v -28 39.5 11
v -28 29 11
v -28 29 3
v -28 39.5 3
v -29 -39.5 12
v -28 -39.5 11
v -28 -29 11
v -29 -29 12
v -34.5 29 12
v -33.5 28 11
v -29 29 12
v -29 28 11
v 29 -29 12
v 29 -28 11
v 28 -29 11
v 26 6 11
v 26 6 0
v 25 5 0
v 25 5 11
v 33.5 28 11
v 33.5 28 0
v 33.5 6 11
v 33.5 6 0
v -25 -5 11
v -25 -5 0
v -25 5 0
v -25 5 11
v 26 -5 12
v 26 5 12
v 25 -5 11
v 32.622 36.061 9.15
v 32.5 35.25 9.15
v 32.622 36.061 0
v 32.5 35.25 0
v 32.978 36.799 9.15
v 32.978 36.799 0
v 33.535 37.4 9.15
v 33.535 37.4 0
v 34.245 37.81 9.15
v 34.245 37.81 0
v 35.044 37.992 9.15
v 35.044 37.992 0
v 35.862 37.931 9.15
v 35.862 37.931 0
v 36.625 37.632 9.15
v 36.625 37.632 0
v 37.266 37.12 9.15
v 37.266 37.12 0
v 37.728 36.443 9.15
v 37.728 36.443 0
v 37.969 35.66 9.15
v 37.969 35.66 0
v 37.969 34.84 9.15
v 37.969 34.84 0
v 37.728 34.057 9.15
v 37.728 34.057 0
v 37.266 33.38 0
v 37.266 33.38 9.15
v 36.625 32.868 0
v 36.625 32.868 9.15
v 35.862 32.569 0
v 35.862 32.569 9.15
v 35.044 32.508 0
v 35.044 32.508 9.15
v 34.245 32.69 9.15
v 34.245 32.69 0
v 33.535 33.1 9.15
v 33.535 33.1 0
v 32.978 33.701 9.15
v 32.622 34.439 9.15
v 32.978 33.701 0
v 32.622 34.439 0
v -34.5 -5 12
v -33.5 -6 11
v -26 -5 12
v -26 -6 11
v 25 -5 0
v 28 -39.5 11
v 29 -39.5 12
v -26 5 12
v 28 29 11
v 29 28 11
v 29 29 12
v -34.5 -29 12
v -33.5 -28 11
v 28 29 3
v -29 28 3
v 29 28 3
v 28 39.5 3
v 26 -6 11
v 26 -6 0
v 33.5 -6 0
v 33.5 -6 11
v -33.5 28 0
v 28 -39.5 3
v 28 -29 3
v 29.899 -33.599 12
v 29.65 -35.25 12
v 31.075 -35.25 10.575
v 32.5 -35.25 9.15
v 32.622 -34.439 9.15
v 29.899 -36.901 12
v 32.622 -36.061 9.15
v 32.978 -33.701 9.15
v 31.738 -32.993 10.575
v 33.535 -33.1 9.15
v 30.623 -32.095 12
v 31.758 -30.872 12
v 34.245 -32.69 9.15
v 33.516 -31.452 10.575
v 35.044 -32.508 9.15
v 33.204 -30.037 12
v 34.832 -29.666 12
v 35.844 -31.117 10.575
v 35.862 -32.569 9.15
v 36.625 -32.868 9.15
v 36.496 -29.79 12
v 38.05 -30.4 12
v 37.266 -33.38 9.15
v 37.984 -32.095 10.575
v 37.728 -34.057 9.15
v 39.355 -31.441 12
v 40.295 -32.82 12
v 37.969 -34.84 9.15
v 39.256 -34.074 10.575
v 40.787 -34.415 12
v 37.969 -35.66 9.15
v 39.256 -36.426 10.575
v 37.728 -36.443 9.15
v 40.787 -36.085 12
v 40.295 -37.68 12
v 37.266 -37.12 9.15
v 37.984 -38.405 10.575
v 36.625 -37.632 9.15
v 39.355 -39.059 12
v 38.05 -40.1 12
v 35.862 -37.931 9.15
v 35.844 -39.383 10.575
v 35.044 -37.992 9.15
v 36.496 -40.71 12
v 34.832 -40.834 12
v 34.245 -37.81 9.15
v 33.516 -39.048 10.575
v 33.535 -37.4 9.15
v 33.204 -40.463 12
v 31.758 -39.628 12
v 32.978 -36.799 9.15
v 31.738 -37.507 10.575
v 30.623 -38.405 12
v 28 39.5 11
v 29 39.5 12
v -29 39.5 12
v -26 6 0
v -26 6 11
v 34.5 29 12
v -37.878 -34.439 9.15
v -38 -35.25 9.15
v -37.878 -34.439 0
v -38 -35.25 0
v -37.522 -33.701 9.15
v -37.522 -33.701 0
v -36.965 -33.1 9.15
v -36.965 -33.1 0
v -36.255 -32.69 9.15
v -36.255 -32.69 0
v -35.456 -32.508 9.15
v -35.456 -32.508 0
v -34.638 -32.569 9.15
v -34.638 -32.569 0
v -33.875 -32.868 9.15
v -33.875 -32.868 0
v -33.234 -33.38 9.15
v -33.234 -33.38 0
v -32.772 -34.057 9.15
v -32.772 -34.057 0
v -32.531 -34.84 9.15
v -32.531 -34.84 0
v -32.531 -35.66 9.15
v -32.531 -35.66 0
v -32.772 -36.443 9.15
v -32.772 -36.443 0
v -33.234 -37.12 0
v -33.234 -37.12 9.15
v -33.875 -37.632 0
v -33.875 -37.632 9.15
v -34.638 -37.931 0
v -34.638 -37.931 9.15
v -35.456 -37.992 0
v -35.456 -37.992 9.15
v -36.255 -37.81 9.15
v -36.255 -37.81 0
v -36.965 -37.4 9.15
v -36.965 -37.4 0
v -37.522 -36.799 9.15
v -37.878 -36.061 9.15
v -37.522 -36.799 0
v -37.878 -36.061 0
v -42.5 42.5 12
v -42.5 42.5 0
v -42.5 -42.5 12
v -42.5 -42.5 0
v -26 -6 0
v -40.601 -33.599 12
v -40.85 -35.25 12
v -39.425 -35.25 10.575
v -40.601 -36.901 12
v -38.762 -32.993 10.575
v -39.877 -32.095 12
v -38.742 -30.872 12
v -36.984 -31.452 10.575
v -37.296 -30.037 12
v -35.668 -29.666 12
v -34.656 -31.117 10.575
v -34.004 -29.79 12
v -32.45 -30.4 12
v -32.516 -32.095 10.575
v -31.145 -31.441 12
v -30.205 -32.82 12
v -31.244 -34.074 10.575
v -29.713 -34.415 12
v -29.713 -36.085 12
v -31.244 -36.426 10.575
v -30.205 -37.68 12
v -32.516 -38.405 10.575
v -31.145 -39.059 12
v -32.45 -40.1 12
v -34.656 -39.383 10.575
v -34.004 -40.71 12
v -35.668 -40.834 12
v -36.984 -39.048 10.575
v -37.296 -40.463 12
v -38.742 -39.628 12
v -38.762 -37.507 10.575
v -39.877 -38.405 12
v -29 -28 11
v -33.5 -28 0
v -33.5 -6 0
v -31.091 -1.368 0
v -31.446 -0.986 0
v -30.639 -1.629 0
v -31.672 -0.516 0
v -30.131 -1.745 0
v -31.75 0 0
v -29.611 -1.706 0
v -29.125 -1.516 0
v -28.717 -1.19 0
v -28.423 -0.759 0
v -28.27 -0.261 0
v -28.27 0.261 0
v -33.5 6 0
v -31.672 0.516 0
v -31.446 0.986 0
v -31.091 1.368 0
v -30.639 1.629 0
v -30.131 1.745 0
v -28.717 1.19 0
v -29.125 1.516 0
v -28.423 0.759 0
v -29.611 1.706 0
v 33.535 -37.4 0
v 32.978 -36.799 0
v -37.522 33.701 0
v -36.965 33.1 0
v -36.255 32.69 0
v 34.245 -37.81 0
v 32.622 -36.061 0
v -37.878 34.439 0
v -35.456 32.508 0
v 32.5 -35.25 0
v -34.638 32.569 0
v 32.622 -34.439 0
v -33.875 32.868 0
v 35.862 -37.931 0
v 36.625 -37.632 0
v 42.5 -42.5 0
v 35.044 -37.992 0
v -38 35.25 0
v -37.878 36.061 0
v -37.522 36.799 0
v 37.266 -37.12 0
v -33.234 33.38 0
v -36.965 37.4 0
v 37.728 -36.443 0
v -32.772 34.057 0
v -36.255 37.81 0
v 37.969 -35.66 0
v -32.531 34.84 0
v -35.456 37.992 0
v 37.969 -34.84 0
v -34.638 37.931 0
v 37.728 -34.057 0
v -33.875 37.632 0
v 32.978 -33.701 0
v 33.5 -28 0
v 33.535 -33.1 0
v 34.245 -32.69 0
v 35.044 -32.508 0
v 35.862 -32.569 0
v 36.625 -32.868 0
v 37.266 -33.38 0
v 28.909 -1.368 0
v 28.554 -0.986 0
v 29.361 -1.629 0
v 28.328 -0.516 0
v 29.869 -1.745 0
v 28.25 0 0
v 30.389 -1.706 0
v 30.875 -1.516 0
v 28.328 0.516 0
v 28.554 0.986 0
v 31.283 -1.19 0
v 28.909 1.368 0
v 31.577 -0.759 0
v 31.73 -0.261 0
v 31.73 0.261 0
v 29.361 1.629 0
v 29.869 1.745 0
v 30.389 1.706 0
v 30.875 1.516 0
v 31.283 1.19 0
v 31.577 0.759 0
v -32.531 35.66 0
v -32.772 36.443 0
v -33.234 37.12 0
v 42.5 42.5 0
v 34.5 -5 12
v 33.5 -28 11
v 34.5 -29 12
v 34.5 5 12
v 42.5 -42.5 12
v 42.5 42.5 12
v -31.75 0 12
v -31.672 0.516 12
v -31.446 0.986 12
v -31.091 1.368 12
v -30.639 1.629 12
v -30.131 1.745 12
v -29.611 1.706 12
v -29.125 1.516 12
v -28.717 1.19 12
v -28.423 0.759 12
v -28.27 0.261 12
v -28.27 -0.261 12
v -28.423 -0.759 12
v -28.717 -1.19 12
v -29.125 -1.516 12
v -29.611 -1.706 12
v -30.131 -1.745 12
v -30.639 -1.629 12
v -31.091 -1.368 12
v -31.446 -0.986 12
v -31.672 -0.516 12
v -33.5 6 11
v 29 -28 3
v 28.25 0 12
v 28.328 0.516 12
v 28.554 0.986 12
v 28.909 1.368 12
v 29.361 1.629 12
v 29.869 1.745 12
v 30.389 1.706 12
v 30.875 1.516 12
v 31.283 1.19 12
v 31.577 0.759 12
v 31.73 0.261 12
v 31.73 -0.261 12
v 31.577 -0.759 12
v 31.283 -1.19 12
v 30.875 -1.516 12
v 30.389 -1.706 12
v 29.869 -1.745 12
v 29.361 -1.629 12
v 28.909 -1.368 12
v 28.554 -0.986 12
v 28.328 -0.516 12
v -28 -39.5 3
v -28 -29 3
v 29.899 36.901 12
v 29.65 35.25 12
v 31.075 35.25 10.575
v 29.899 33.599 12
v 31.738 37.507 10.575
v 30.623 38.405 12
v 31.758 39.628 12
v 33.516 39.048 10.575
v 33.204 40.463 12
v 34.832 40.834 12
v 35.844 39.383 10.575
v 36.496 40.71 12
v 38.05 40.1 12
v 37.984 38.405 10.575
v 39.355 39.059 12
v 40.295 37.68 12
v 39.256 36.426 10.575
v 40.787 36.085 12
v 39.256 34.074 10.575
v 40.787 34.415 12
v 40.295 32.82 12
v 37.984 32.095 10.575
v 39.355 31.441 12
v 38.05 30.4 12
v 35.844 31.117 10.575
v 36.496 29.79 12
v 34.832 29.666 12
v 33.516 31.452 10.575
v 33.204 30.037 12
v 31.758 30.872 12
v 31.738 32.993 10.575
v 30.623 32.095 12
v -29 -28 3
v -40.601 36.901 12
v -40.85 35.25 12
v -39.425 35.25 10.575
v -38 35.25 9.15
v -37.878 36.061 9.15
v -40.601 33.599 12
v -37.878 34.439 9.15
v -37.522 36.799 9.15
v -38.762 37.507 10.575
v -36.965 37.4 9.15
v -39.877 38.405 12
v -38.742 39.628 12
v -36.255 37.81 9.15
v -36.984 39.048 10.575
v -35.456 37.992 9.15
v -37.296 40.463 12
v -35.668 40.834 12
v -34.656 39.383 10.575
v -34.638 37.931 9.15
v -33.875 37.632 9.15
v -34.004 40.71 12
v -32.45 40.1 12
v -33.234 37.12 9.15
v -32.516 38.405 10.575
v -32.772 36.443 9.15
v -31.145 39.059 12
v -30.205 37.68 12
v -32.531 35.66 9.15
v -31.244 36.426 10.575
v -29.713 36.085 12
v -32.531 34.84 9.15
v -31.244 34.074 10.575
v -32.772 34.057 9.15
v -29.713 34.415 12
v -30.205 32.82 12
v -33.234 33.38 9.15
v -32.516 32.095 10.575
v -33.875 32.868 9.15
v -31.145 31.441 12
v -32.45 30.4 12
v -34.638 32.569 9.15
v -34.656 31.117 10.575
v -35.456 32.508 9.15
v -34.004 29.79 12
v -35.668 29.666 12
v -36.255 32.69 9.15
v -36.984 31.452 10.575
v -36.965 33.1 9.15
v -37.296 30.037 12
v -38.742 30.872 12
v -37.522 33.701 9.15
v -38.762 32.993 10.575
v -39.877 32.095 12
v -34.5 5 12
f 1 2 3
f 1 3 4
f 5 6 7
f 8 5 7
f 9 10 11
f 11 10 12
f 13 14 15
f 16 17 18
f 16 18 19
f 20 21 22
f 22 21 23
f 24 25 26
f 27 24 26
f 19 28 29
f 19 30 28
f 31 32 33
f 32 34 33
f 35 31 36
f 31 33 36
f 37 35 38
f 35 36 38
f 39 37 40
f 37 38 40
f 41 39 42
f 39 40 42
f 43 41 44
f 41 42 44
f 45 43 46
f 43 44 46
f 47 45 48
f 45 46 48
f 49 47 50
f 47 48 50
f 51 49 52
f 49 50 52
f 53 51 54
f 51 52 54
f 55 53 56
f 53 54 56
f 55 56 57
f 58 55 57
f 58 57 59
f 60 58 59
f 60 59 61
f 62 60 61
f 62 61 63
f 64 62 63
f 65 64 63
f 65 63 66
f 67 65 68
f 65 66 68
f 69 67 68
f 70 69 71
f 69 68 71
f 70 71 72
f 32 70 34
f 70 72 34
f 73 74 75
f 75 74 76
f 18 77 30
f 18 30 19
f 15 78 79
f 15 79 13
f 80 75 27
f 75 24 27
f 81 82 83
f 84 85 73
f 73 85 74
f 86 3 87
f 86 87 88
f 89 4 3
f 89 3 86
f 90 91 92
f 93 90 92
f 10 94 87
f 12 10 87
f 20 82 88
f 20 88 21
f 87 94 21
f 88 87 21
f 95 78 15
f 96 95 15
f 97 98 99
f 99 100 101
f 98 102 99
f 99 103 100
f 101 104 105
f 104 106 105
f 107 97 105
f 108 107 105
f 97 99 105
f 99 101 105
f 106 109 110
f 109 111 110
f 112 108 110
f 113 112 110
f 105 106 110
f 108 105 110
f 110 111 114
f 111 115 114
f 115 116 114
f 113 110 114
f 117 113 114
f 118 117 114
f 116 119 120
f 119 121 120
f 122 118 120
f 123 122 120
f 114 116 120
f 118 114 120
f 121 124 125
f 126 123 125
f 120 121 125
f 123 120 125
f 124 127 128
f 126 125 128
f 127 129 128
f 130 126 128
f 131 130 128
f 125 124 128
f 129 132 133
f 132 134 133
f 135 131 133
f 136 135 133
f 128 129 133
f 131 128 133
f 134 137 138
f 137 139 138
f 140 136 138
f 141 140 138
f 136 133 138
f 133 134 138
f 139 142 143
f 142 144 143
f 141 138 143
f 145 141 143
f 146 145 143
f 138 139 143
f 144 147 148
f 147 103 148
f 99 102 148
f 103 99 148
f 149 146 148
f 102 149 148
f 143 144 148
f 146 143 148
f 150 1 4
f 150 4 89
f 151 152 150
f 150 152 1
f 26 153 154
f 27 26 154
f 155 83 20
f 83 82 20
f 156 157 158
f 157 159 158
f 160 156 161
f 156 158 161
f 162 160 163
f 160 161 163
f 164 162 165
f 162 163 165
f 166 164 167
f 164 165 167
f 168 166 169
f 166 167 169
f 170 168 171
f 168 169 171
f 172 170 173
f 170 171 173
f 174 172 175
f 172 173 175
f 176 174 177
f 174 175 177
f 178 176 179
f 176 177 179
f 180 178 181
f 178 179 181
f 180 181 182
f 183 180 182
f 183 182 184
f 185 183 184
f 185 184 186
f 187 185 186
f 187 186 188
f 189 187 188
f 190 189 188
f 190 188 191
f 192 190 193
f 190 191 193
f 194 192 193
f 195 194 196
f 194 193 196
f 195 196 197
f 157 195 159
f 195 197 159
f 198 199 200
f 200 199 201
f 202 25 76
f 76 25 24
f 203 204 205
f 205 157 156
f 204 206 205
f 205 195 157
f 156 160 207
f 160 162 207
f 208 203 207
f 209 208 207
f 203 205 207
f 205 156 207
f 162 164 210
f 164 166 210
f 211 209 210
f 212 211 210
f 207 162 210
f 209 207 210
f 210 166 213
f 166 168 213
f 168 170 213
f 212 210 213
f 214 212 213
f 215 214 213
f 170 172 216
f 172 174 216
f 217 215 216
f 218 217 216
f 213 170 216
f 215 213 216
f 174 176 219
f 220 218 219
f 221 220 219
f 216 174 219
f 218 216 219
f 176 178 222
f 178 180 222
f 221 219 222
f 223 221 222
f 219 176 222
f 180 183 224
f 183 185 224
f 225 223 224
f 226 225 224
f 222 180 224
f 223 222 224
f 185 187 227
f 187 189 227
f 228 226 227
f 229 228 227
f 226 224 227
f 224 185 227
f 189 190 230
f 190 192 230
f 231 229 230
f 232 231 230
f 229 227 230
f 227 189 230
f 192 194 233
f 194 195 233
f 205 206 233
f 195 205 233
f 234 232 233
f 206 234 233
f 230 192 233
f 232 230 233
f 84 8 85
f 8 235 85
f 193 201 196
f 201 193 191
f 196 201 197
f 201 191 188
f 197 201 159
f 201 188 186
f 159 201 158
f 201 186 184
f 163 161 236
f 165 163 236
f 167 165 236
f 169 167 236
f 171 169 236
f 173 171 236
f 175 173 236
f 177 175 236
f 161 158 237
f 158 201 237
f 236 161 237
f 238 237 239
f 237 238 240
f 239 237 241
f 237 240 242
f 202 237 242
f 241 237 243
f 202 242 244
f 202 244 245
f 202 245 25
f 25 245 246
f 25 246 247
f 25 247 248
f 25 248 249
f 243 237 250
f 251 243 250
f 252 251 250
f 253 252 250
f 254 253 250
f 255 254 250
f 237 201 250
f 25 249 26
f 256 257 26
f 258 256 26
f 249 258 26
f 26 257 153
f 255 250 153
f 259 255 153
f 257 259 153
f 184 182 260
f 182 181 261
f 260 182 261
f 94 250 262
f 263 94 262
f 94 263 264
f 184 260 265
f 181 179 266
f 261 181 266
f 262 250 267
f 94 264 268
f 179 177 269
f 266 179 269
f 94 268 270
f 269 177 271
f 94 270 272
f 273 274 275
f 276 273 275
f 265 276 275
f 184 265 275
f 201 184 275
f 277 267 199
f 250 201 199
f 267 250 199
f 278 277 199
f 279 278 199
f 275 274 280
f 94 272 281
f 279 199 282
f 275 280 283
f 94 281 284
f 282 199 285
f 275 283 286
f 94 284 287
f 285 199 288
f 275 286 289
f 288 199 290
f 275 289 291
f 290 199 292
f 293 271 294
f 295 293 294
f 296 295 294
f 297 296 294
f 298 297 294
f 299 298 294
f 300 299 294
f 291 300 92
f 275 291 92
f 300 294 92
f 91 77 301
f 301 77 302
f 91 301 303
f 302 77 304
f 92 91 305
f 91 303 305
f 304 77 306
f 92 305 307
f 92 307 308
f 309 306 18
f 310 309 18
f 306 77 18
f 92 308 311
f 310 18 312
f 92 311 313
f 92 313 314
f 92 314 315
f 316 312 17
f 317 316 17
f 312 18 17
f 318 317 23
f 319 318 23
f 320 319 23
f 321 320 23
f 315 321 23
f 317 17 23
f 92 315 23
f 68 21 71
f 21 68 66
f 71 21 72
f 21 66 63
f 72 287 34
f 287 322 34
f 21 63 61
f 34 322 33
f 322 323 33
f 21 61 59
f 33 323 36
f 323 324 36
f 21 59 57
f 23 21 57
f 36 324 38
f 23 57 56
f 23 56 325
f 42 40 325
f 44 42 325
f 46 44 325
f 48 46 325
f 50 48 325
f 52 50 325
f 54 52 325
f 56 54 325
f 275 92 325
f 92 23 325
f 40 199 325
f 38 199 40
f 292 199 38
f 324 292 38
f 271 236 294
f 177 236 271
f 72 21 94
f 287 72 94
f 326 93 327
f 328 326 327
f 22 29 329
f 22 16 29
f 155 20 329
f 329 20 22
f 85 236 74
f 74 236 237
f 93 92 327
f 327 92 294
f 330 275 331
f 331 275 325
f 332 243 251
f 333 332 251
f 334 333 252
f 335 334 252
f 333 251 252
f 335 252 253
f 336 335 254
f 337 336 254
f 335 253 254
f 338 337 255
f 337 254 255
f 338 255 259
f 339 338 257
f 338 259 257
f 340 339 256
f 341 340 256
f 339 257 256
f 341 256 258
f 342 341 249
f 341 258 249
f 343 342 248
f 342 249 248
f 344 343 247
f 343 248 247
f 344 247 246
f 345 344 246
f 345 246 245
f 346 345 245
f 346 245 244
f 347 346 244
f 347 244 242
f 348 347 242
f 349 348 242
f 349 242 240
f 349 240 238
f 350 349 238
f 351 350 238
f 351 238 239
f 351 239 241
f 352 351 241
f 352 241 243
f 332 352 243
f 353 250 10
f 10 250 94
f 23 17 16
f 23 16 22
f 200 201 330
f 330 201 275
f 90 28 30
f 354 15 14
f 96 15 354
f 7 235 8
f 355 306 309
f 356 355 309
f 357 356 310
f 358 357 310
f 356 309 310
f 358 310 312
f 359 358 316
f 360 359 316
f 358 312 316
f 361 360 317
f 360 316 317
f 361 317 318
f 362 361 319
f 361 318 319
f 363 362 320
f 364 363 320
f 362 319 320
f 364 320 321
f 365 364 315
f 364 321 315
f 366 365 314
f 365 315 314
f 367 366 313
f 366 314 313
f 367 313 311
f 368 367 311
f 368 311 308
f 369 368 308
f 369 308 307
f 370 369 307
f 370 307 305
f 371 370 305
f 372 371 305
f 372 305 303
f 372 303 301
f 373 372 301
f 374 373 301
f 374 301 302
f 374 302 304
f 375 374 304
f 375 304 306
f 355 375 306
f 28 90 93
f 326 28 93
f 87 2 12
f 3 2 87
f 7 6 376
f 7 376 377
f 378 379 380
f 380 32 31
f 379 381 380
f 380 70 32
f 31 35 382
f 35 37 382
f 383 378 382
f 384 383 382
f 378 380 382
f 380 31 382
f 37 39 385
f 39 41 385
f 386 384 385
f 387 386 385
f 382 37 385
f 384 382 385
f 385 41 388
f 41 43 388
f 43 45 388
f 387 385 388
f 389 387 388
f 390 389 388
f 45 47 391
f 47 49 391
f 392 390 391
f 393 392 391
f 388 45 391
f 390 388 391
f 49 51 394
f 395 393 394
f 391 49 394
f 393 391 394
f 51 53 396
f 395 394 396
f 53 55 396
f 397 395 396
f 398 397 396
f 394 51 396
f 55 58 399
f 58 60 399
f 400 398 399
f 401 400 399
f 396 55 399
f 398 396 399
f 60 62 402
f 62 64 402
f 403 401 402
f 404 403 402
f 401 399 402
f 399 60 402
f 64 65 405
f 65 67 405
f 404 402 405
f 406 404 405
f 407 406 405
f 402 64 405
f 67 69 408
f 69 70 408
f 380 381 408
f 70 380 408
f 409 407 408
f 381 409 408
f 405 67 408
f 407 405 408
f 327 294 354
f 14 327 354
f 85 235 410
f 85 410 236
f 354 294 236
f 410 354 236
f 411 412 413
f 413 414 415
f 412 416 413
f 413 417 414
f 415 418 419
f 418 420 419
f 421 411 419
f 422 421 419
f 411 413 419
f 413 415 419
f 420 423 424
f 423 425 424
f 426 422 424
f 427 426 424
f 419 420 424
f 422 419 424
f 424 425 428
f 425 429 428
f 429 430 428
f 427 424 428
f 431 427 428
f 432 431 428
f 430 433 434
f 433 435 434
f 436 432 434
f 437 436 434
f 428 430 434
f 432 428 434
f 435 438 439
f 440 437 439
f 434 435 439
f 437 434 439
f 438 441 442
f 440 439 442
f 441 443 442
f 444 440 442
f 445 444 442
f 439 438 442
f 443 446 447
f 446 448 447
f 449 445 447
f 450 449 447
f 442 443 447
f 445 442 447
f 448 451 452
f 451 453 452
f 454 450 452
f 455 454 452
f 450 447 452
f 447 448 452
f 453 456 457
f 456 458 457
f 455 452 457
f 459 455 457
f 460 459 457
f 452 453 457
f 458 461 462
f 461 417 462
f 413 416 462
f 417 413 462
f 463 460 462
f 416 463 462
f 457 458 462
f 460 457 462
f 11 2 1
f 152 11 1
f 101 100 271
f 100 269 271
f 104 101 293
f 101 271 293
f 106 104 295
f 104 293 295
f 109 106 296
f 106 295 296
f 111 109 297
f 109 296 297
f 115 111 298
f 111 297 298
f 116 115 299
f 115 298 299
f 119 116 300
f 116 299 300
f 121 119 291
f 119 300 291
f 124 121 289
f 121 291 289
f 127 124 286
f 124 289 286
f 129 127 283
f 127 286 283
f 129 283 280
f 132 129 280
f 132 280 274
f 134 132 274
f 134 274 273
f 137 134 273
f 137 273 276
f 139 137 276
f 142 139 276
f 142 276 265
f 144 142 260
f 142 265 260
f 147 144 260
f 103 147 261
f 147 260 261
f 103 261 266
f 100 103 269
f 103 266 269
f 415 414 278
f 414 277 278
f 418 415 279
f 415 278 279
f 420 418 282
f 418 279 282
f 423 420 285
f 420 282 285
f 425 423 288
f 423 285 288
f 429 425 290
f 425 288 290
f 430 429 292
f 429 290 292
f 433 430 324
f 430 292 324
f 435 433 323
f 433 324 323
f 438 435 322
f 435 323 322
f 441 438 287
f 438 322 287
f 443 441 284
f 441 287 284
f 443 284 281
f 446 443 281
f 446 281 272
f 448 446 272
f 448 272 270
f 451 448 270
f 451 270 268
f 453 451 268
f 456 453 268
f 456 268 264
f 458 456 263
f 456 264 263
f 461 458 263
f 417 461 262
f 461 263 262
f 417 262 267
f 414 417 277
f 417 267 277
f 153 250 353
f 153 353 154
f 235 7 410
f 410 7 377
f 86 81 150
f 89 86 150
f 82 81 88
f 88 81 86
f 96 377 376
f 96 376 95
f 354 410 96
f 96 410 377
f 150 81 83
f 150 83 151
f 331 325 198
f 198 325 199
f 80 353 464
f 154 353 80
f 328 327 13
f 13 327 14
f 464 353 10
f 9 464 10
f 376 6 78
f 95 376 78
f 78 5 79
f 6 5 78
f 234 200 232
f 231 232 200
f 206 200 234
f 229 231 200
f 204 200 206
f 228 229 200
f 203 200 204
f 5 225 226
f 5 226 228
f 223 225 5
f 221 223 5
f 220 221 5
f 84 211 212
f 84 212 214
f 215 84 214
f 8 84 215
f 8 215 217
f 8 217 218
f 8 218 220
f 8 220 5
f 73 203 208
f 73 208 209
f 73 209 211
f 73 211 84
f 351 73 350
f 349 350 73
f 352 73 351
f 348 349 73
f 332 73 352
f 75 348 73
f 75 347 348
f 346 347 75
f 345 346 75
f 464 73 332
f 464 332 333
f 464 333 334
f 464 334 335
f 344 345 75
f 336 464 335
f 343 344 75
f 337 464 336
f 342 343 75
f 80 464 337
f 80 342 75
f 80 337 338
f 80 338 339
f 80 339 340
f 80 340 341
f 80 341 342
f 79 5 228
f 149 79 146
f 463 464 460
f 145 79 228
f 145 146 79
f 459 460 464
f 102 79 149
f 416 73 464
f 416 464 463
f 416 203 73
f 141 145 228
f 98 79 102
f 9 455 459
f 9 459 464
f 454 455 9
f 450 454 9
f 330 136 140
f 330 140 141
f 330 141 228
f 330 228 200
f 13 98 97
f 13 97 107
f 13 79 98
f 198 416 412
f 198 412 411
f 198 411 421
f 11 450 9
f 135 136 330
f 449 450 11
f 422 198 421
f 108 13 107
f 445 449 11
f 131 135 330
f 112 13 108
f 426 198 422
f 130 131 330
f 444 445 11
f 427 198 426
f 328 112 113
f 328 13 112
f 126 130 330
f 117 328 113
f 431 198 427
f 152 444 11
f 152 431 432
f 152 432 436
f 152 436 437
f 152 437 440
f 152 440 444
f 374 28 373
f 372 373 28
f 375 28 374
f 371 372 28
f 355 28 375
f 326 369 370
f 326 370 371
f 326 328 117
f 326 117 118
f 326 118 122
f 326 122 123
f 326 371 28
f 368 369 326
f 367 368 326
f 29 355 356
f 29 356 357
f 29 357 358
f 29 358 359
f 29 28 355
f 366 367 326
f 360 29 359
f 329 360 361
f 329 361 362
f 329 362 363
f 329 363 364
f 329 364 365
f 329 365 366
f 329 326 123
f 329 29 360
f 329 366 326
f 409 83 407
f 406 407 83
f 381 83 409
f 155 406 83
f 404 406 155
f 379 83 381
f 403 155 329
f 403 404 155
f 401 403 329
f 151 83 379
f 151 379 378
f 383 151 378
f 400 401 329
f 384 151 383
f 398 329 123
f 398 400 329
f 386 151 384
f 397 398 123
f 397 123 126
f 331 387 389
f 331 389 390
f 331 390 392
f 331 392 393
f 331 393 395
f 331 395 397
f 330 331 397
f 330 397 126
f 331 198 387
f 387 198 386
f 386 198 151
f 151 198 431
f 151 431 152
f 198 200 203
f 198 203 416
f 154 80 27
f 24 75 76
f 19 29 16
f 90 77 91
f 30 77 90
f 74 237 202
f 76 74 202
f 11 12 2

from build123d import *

# Parameters (mm, degrees)
F0_W           = 9
F0_H           = 12
F0_W_2         = 8.5
F1_DEPTH       = 12
F3_D           = 3.5
F4_D           = 5.5
F4_CSINK_D     = 11.2
F4_CSINK_ANGLE = 90
F5_W           = 56
F5_H           = 11.5
F6_DEPTH       = 9
F7_SIZE        = 1


with BuildPart() as f1:
    # F0 (on Top) → F1 (new body)
    with BuildSketch(Plane.XY):
        Polygon((-42.5, -6), (-42.5, -42.5), (42.5, -42.5), (42.5, -6), (33.5, -6), (33.5, -28), (-33.5, -28), (-33.5, -6), align=None)
        Polygon((-42.5, 42.5), (-42.5, 6), (-33.5, 6), (-33.5, 28), (33.5, 28), (33.5, 6), (42.5, 6), (42.5, 42.5), align=None)
        with Locations((-38, 0)):
            Rectangle(F0_W, F0_H)
        with Locations((-29.25, 0)):
            Rectangle(F0_W_2, F0_H)
        with Locations((38, 0)):
            Rectangle(F0_W, F0_H)
        with Locations((29.25, 0)):
            Rectangle(F0_W_2, F0_H)
    extrude(amount=F1_DEPTH)

    # F3 (through all)
    with Locations(Plane.XY.offset(12)):
        with Locations((-30, 0), (30, 0)):
            Hole(F3_D / 2)

    # F4 (through all)
    with Locations(Plane.XY.offset(12)):
        with Locations((-35.25, 35.25), (35.25, 35.25), (35.25, -35.25), (-35.25, -35.25)):
            CounterSinkHole(F4_D / 2, F4_CSINK_D / 2, counter_sink_angle=F4_CSINK_ANGLE)

    # F5 (on face) → F6 (cut)
    with BuildSketch(Plane.XY.offset(12)):
        with Locations((0, -33.75)):
            Rectangle(F5_W, F5_H)
        with Locations((0, 33.75)):
            Rectangle(F5_W, F5_H)
    extrude(amount=-F6_DEPTH, mode=Mode.SUBTRACT)

    # F7
    f7_edges = [f1.edges().sort_by_distance(p)[0] for p in [
        (-30.75, 28, 12),
        (-33.5, 17, 12),
        (-29.25, 6, 12),
        (-25, 0, 12),
        (-29.25, -6, 12),
        (-33.5, -17, 12),
        (-30.75, -28, 12),
        (30.75, 28, 12),
        (33.5, 17, 12),
        (29.25, 6, 12),
        (25, 0, 12),
        (29.25, -6, 12),
        (33.5, -17, 12),
        (30.75, -28, 12),
        (-28, -28, 7.5),
        (28, -28, 7.5),
        (-28, 28, 7.5),
        (28, 28, 7.5),
        (-25, 6, 6),
        (-25, -6, 6),
        (25, 6, 6),
        (25, -6, 6),
        (-28, 33.75, 12),
        (28, 33.75, 12),
        (28, -33.75, 12),
        (-28, -33.75, 12),
    ]]
    chamfer(f7_edges, length=F7_SIZE)


solid = f1.part
